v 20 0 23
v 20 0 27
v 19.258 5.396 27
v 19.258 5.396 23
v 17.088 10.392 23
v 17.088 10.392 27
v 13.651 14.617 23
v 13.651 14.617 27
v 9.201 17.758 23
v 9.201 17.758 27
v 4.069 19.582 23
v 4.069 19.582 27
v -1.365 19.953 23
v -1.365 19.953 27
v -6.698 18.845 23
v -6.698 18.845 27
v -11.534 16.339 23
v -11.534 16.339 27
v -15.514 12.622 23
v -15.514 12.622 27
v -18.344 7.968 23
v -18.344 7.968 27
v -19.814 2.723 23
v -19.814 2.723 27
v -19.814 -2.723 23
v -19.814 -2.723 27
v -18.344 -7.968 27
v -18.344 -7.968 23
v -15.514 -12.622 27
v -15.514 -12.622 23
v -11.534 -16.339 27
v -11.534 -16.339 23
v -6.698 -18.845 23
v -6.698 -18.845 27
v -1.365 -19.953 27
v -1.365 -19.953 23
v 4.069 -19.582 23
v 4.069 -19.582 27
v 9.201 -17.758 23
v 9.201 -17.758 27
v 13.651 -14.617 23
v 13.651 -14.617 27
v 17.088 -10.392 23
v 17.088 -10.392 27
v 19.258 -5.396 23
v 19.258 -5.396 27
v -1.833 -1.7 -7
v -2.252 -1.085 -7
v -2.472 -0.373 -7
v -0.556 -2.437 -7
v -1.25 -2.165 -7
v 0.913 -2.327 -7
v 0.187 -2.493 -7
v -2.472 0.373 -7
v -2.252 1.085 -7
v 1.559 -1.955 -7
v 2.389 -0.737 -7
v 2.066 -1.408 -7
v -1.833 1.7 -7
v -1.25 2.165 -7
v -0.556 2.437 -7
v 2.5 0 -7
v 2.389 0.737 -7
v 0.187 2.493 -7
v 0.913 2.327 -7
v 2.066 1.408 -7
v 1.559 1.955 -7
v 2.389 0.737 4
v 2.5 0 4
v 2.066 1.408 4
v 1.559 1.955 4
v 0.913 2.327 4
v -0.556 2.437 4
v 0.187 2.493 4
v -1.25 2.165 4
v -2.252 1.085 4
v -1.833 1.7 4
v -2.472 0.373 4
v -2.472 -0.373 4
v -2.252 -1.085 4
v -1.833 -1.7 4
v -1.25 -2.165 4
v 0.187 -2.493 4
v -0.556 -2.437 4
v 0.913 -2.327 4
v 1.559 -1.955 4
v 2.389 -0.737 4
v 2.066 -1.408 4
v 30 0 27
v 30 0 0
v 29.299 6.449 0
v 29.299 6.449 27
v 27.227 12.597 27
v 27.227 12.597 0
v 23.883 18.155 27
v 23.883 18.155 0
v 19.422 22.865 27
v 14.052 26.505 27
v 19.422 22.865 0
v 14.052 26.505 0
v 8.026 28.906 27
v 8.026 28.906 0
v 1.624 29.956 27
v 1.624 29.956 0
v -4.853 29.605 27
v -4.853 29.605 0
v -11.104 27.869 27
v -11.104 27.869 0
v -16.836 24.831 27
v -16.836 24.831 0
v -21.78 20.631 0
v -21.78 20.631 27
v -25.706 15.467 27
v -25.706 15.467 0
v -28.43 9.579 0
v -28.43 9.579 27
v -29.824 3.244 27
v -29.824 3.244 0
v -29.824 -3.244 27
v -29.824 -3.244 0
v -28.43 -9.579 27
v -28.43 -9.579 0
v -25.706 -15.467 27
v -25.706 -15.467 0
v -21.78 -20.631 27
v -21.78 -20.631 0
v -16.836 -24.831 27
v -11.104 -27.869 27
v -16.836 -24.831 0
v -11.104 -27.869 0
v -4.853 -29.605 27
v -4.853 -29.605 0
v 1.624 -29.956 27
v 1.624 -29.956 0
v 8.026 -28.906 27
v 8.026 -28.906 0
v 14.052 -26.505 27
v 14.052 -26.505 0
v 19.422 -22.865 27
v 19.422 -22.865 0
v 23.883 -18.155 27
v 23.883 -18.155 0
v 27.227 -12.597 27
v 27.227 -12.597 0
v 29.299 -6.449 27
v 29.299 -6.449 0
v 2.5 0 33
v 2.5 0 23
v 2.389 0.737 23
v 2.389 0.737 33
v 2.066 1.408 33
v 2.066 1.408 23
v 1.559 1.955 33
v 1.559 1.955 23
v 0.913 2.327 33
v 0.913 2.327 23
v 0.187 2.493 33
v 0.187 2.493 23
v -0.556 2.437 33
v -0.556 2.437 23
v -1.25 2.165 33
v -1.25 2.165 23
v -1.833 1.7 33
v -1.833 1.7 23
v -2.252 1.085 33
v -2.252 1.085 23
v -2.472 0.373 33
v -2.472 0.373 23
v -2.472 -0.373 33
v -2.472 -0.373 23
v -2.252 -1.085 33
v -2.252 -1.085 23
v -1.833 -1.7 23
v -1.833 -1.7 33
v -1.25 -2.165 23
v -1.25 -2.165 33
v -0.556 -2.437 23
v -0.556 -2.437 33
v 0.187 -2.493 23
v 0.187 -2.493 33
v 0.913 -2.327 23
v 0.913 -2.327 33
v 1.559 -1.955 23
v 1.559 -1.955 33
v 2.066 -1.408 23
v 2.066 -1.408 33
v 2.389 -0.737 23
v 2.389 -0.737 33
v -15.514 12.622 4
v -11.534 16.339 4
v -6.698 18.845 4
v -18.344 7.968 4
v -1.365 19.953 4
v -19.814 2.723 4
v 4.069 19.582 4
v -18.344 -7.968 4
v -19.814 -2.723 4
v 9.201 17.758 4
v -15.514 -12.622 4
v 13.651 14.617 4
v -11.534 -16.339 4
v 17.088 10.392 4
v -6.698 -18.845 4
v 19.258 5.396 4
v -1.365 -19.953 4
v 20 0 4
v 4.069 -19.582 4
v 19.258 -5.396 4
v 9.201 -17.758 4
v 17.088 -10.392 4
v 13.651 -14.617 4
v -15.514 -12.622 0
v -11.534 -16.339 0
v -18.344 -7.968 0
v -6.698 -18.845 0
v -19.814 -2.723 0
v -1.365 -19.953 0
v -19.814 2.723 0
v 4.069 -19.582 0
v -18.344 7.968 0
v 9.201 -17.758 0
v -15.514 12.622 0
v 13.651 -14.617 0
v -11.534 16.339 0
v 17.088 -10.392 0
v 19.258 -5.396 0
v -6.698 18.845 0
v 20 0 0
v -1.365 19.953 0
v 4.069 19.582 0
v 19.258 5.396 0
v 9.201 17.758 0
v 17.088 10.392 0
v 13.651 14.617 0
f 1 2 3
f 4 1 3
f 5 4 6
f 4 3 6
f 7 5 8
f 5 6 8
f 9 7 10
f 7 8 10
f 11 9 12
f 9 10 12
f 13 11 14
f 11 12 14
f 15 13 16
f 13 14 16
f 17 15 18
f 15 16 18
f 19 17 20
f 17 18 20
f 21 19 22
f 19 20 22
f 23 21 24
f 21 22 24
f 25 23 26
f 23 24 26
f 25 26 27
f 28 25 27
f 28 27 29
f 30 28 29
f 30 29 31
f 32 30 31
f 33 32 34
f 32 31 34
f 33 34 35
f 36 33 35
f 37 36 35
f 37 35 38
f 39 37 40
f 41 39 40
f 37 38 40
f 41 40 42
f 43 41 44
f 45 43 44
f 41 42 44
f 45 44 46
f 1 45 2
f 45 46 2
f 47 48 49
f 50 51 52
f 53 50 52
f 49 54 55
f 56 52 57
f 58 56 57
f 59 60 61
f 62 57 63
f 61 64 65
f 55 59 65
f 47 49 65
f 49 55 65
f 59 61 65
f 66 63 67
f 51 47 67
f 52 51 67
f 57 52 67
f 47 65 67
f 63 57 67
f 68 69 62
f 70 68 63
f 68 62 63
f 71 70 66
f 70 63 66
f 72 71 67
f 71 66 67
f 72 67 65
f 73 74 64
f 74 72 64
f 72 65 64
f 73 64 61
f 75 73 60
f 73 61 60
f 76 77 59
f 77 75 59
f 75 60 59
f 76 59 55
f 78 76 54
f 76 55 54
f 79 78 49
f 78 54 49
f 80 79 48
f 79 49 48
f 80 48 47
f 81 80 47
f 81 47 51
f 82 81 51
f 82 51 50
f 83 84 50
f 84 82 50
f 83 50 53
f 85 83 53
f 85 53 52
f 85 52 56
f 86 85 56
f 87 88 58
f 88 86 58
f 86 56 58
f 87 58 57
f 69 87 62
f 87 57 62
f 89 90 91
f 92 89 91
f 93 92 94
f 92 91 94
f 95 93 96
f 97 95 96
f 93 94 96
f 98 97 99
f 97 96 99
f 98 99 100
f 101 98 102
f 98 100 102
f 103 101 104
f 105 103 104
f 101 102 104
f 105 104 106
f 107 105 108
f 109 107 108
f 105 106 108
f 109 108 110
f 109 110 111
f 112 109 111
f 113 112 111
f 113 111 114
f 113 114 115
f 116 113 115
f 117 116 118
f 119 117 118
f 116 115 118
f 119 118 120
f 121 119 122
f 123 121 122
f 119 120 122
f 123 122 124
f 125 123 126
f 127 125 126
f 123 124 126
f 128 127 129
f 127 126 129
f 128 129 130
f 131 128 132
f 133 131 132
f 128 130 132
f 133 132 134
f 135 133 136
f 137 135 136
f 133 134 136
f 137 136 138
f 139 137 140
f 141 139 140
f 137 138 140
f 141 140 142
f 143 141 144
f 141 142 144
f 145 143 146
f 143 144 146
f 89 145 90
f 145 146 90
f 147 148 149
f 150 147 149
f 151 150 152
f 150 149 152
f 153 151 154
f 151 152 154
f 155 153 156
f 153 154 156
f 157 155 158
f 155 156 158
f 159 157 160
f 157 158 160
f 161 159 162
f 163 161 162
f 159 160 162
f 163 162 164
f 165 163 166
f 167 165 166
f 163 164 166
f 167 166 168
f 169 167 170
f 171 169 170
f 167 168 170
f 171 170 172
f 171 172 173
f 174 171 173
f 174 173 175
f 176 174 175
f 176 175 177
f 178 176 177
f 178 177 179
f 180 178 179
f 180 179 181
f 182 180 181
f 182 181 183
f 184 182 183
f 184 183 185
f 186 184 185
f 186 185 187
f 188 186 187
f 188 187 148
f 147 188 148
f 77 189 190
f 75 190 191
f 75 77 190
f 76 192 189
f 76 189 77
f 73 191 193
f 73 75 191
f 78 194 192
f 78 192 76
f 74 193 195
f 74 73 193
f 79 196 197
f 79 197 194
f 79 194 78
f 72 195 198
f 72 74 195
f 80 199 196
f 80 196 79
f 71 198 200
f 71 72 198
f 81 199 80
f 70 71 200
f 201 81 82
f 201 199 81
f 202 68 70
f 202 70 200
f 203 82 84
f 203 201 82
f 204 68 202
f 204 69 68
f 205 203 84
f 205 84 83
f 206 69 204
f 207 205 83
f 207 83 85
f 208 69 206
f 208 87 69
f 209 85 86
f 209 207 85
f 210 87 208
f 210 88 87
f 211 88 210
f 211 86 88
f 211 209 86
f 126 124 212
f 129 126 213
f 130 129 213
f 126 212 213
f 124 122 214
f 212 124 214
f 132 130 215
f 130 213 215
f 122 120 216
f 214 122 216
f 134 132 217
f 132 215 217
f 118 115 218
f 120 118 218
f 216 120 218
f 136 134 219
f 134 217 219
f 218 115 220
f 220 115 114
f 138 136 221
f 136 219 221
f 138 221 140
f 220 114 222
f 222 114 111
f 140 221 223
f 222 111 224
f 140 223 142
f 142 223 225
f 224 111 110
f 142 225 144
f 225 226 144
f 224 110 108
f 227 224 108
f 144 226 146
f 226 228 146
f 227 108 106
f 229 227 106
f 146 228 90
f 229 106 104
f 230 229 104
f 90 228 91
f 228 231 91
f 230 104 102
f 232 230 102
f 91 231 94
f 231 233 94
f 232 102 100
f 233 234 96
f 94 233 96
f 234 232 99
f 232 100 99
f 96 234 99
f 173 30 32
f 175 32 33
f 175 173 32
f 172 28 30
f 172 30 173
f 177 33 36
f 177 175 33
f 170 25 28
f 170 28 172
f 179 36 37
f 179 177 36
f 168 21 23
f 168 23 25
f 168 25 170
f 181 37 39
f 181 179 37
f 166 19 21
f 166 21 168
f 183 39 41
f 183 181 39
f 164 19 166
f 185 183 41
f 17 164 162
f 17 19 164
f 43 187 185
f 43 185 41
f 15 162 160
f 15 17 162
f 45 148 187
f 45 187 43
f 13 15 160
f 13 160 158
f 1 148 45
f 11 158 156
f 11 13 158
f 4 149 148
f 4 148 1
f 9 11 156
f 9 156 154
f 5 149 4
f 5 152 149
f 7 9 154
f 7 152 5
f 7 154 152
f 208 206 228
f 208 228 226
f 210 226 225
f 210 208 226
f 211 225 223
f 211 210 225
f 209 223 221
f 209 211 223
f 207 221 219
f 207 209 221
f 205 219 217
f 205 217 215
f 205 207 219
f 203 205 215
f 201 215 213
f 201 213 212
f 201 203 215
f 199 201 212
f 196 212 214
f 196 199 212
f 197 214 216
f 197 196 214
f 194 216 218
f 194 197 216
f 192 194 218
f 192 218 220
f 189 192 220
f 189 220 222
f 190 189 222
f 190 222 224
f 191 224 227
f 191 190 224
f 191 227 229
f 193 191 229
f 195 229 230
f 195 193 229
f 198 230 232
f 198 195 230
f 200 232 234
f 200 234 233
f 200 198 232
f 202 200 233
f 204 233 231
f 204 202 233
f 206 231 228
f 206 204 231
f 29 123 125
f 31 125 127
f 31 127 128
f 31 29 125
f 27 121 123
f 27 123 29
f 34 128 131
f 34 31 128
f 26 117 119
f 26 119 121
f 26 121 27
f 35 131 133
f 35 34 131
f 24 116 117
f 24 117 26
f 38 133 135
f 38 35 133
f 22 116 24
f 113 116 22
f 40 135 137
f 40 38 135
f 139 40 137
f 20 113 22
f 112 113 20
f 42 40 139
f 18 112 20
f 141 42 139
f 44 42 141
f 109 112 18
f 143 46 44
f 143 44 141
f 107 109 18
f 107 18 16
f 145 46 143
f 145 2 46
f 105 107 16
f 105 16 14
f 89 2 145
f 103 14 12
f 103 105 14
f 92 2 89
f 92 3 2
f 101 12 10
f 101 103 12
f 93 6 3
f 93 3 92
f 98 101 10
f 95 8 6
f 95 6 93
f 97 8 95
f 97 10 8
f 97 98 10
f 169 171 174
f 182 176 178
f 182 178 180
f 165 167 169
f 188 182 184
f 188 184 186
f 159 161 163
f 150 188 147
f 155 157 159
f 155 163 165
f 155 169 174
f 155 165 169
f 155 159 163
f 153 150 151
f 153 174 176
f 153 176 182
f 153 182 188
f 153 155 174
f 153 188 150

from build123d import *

# Parameters (mm, degrees)
SKETCH1_R                = 30
BOSS_EXTRUDE1_DEPTH      = 27
SKETCH3_R                = 20
CUT_EXTRUDE1_DEPTH       = 4
CUT_EXTRUDE2_START       = -4
SKETCH4_R                = 20
CUT_EXTRUDE2_DEPTH       = 4
BOSS_EXTRUDE2_DEPTH      = 10
BOSS_EXTRUDE2_DEPTH_BACK = 30
SKETCH5_R                = 2.5


with BuildPart() as part:
    # Sketch1 → Boss-Extrude1 (new body)
    with BuildSketch(Plane.XY):
        Circle(SKETCH1_R)
    extrude(amount=BOSS_EXTRUDE1_DEPTH)

    # Sketch3 → Cut-Extrude1 (cut)
    with BuildSketch(Plane.XY.offset(27)):
        Circle(SKETCH3_R)
    extrude(amount=-CUT_EXTRUDE1_DEPTH, mode=Mode.SUBTRACT)

    # Sketch4 → Cut-Extrude2 (cut)
    with BuildSketch(Plane(origin=(0, 0, 0), x_dir=(-1, 0, 0), z_dir=(0, 0, -1)).offset(CUT_EXTRUDE2_START)):
        with Locations(Location((0, 0, 0), (0, 0, 180))):
            Circle(SKETCH4_R)
    extrude(amount=CUT_EXTRUDE2_DEPTH, mode=Mode.SUBTRACT)

    # Sketch5 → Boss-Extrude2 (add, two sides: drawn at the far end of the back side and taken through both)
    with BuildSketch(Plane.XY.offset(23).offset(-BOSS_EXTRUDE2_DEPTH_BACK)):
        Circle(SKETCH5_R)
    extrude(amount=BOSS_EXTRUDE2_DEPTH + BOSS_EXTRUDE2_DEPTH_BACK)


solid = part.part
